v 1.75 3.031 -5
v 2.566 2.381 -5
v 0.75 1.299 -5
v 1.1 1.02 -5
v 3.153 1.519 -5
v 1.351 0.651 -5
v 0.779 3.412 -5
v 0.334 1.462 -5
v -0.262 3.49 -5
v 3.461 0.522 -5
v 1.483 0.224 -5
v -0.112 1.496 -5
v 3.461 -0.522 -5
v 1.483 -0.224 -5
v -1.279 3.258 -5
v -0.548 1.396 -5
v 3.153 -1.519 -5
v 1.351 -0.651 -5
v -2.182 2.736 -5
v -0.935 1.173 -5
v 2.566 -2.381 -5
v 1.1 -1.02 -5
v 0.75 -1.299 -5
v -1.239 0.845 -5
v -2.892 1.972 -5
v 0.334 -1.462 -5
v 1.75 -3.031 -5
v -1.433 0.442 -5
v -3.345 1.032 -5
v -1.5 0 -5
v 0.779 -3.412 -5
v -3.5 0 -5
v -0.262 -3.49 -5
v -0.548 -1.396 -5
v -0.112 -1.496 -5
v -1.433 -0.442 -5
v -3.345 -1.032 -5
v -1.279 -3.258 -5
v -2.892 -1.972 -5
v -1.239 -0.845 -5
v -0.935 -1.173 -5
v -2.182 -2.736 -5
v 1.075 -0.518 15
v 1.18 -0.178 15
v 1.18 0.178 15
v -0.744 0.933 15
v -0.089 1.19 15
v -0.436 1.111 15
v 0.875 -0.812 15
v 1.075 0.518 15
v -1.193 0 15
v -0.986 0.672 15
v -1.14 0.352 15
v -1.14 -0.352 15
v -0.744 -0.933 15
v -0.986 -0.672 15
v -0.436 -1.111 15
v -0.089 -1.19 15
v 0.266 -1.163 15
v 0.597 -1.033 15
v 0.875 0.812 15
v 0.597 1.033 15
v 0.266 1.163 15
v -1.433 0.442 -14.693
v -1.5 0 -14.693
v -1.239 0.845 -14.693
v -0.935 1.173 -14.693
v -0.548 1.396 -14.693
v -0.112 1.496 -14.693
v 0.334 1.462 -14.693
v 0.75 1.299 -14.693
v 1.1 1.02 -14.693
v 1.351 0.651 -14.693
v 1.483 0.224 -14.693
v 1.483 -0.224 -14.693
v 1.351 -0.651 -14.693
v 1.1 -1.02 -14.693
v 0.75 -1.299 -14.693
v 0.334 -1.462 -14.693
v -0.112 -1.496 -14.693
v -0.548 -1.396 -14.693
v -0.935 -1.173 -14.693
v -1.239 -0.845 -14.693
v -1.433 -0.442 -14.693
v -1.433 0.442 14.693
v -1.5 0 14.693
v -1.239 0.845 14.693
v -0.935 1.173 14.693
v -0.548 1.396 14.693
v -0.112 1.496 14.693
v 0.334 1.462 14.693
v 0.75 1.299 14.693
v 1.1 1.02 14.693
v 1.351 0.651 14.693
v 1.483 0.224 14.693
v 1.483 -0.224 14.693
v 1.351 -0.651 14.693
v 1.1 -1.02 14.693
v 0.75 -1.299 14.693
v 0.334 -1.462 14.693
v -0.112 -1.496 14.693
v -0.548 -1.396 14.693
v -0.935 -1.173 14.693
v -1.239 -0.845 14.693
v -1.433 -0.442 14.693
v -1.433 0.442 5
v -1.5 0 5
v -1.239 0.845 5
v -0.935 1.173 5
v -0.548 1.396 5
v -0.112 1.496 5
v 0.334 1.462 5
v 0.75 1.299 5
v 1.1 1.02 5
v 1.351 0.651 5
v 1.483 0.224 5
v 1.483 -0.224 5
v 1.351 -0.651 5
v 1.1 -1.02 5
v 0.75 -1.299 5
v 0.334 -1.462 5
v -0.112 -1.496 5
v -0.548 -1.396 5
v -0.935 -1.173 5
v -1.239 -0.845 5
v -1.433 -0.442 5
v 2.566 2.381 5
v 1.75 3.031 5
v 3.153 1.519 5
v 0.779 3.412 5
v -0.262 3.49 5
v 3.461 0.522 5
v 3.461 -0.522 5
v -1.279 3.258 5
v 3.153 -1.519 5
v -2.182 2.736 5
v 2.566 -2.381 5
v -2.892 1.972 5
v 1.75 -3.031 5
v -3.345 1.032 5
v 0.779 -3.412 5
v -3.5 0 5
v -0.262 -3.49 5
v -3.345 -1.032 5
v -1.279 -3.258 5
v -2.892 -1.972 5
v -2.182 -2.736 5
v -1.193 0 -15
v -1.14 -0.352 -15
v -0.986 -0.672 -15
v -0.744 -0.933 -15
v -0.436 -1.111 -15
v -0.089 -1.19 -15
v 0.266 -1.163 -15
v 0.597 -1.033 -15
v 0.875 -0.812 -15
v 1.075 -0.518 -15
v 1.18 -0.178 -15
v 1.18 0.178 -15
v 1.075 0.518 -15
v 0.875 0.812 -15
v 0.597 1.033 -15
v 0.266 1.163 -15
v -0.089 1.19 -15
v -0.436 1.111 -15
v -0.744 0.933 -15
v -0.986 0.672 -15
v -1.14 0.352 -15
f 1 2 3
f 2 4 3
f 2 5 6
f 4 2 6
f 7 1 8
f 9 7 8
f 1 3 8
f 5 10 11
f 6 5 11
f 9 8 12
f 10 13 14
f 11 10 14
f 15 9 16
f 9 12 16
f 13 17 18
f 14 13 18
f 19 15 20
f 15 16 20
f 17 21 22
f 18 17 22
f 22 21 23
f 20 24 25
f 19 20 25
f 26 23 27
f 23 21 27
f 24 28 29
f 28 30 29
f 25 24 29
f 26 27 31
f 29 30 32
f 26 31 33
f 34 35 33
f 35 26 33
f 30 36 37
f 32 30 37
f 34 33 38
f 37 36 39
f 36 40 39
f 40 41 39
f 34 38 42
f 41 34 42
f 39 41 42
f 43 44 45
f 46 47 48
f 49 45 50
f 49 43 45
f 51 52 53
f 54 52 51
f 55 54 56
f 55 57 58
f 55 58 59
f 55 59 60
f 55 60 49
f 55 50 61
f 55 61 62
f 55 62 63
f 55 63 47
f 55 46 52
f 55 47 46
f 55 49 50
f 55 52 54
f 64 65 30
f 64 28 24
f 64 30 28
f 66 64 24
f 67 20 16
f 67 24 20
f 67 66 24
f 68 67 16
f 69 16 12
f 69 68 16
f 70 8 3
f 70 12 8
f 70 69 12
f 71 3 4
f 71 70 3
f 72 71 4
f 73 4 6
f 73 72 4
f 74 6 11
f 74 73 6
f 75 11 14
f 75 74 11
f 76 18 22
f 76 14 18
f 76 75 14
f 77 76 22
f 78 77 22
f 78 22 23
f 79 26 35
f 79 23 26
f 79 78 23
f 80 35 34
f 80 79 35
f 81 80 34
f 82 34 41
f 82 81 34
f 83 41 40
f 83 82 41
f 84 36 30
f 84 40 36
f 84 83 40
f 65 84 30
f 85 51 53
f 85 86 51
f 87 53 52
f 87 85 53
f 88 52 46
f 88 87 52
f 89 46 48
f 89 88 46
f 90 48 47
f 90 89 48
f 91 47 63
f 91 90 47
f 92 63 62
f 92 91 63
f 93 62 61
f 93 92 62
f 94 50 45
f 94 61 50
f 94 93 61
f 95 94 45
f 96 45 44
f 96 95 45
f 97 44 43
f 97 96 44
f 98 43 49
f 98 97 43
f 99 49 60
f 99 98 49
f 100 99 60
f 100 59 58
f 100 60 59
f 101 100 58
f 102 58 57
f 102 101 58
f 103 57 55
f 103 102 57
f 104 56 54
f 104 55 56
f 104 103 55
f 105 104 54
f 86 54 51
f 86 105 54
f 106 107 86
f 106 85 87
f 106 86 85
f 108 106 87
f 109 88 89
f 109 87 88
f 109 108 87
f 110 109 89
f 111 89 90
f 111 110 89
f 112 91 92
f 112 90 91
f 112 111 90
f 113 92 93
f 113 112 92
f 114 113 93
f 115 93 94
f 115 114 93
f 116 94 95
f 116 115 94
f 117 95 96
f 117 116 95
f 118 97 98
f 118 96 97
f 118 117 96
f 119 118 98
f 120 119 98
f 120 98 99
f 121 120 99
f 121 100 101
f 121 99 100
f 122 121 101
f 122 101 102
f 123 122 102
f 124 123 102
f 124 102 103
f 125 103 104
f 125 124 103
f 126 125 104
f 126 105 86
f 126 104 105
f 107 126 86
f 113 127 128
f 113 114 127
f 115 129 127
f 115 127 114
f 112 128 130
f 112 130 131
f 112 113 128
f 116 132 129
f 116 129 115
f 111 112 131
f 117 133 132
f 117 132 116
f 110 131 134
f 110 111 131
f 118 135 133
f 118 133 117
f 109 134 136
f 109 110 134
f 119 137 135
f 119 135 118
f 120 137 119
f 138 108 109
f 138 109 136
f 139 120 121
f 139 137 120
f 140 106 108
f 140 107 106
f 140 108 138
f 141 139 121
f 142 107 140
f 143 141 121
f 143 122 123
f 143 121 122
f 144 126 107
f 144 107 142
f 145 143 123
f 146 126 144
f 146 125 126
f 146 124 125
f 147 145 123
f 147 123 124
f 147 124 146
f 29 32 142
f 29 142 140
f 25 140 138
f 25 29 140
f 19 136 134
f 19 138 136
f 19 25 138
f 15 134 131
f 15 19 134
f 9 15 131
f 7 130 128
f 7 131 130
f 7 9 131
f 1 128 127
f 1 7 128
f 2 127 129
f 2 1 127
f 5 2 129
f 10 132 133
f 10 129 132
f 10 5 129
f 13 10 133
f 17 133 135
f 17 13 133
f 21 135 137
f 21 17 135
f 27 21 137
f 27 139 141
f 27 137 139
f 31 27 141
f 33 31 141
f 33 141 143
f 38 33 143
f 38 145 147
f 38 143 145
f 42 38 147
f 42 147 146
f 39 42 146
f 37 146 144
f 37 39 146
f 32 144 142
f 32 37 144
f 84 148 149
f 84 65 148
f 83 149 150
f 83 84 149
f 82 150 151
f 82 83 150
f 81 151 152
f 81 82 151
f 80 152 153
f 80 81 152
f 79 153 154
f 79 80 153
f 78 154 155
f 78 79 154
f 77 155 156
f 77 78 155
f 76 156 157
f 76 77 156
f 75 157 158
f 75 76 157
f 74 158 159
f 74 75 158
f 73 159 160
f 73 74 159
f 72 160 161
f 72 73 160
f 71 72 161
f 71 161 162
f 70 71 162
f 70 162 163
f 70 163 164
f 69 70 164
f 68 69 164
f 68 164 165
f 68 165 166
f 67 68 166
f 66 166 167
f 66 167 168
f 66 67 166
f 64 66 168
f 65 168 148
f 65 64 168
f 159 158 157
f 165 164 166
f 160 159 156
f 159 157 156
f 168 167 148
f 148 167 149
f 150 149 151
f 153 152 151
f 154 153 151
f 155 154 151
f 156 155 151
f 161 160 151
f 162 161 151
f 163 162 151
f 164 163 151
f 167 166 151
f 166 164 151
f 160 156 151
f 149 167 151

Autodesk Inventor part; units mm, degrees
ref_plane "YZ Plane" through (0, 0, 0) normal (1, 0, 0) x (0, 1, 0)
ref_plane "XZ Plane" through (0, 0, 0) normal (0, 1, 0) x (-1, 0, 0)
ref_plane "XY Plane" through (0, 0, 0) normal (0, 0, 1) x (1, 0, 0)
sketch "Boceto1" plane through (0, 0, 0) normal (0, 1, 0) x (-1, 0, 0)
  line L0 (0, 15) -> (1.5, 15)
  line L1 (1.5, 15) -> (1.5, 5)
  line L2 (1.5, 5) -> (3.5, 5)
  line L3 (3.5, 5) -> (3.5, -5)
  line L4 (3.5, -5) -> (1.5, -5)
  line L5 (1.5, -5) -> (1.5, -15)
  line L6 (1.5, -15) -> (0, -15)
  line L7 (0, -15) -> (0, 15)
  point P0 (0, 0)
  point P1 (0, 0)
  dimension "d0" = 7
  dimension "d1" = 3
  dimension "Dedos" = 10
  dimension "d3" = 30
revolve "Revolución1" add sketch "Boceto1" angle 360 about axis through (0, 0, -15) along (0, 0, 1)
thread "Rosca2" size "M3x0.5" class "6g" standard "ANSI Metric M Profile" length 4
thread "Rosca3" size "M3x0.5" class "6g" standard "ANSI Metric M Profile" length 4 offset 6
chamfer "Chaflán1" distance 0.3067 angle 45 2 edges at (1.5, 0, 15) (1.5, 0, -15)
properties part number "Clavija" material "Aluminio 6061"
